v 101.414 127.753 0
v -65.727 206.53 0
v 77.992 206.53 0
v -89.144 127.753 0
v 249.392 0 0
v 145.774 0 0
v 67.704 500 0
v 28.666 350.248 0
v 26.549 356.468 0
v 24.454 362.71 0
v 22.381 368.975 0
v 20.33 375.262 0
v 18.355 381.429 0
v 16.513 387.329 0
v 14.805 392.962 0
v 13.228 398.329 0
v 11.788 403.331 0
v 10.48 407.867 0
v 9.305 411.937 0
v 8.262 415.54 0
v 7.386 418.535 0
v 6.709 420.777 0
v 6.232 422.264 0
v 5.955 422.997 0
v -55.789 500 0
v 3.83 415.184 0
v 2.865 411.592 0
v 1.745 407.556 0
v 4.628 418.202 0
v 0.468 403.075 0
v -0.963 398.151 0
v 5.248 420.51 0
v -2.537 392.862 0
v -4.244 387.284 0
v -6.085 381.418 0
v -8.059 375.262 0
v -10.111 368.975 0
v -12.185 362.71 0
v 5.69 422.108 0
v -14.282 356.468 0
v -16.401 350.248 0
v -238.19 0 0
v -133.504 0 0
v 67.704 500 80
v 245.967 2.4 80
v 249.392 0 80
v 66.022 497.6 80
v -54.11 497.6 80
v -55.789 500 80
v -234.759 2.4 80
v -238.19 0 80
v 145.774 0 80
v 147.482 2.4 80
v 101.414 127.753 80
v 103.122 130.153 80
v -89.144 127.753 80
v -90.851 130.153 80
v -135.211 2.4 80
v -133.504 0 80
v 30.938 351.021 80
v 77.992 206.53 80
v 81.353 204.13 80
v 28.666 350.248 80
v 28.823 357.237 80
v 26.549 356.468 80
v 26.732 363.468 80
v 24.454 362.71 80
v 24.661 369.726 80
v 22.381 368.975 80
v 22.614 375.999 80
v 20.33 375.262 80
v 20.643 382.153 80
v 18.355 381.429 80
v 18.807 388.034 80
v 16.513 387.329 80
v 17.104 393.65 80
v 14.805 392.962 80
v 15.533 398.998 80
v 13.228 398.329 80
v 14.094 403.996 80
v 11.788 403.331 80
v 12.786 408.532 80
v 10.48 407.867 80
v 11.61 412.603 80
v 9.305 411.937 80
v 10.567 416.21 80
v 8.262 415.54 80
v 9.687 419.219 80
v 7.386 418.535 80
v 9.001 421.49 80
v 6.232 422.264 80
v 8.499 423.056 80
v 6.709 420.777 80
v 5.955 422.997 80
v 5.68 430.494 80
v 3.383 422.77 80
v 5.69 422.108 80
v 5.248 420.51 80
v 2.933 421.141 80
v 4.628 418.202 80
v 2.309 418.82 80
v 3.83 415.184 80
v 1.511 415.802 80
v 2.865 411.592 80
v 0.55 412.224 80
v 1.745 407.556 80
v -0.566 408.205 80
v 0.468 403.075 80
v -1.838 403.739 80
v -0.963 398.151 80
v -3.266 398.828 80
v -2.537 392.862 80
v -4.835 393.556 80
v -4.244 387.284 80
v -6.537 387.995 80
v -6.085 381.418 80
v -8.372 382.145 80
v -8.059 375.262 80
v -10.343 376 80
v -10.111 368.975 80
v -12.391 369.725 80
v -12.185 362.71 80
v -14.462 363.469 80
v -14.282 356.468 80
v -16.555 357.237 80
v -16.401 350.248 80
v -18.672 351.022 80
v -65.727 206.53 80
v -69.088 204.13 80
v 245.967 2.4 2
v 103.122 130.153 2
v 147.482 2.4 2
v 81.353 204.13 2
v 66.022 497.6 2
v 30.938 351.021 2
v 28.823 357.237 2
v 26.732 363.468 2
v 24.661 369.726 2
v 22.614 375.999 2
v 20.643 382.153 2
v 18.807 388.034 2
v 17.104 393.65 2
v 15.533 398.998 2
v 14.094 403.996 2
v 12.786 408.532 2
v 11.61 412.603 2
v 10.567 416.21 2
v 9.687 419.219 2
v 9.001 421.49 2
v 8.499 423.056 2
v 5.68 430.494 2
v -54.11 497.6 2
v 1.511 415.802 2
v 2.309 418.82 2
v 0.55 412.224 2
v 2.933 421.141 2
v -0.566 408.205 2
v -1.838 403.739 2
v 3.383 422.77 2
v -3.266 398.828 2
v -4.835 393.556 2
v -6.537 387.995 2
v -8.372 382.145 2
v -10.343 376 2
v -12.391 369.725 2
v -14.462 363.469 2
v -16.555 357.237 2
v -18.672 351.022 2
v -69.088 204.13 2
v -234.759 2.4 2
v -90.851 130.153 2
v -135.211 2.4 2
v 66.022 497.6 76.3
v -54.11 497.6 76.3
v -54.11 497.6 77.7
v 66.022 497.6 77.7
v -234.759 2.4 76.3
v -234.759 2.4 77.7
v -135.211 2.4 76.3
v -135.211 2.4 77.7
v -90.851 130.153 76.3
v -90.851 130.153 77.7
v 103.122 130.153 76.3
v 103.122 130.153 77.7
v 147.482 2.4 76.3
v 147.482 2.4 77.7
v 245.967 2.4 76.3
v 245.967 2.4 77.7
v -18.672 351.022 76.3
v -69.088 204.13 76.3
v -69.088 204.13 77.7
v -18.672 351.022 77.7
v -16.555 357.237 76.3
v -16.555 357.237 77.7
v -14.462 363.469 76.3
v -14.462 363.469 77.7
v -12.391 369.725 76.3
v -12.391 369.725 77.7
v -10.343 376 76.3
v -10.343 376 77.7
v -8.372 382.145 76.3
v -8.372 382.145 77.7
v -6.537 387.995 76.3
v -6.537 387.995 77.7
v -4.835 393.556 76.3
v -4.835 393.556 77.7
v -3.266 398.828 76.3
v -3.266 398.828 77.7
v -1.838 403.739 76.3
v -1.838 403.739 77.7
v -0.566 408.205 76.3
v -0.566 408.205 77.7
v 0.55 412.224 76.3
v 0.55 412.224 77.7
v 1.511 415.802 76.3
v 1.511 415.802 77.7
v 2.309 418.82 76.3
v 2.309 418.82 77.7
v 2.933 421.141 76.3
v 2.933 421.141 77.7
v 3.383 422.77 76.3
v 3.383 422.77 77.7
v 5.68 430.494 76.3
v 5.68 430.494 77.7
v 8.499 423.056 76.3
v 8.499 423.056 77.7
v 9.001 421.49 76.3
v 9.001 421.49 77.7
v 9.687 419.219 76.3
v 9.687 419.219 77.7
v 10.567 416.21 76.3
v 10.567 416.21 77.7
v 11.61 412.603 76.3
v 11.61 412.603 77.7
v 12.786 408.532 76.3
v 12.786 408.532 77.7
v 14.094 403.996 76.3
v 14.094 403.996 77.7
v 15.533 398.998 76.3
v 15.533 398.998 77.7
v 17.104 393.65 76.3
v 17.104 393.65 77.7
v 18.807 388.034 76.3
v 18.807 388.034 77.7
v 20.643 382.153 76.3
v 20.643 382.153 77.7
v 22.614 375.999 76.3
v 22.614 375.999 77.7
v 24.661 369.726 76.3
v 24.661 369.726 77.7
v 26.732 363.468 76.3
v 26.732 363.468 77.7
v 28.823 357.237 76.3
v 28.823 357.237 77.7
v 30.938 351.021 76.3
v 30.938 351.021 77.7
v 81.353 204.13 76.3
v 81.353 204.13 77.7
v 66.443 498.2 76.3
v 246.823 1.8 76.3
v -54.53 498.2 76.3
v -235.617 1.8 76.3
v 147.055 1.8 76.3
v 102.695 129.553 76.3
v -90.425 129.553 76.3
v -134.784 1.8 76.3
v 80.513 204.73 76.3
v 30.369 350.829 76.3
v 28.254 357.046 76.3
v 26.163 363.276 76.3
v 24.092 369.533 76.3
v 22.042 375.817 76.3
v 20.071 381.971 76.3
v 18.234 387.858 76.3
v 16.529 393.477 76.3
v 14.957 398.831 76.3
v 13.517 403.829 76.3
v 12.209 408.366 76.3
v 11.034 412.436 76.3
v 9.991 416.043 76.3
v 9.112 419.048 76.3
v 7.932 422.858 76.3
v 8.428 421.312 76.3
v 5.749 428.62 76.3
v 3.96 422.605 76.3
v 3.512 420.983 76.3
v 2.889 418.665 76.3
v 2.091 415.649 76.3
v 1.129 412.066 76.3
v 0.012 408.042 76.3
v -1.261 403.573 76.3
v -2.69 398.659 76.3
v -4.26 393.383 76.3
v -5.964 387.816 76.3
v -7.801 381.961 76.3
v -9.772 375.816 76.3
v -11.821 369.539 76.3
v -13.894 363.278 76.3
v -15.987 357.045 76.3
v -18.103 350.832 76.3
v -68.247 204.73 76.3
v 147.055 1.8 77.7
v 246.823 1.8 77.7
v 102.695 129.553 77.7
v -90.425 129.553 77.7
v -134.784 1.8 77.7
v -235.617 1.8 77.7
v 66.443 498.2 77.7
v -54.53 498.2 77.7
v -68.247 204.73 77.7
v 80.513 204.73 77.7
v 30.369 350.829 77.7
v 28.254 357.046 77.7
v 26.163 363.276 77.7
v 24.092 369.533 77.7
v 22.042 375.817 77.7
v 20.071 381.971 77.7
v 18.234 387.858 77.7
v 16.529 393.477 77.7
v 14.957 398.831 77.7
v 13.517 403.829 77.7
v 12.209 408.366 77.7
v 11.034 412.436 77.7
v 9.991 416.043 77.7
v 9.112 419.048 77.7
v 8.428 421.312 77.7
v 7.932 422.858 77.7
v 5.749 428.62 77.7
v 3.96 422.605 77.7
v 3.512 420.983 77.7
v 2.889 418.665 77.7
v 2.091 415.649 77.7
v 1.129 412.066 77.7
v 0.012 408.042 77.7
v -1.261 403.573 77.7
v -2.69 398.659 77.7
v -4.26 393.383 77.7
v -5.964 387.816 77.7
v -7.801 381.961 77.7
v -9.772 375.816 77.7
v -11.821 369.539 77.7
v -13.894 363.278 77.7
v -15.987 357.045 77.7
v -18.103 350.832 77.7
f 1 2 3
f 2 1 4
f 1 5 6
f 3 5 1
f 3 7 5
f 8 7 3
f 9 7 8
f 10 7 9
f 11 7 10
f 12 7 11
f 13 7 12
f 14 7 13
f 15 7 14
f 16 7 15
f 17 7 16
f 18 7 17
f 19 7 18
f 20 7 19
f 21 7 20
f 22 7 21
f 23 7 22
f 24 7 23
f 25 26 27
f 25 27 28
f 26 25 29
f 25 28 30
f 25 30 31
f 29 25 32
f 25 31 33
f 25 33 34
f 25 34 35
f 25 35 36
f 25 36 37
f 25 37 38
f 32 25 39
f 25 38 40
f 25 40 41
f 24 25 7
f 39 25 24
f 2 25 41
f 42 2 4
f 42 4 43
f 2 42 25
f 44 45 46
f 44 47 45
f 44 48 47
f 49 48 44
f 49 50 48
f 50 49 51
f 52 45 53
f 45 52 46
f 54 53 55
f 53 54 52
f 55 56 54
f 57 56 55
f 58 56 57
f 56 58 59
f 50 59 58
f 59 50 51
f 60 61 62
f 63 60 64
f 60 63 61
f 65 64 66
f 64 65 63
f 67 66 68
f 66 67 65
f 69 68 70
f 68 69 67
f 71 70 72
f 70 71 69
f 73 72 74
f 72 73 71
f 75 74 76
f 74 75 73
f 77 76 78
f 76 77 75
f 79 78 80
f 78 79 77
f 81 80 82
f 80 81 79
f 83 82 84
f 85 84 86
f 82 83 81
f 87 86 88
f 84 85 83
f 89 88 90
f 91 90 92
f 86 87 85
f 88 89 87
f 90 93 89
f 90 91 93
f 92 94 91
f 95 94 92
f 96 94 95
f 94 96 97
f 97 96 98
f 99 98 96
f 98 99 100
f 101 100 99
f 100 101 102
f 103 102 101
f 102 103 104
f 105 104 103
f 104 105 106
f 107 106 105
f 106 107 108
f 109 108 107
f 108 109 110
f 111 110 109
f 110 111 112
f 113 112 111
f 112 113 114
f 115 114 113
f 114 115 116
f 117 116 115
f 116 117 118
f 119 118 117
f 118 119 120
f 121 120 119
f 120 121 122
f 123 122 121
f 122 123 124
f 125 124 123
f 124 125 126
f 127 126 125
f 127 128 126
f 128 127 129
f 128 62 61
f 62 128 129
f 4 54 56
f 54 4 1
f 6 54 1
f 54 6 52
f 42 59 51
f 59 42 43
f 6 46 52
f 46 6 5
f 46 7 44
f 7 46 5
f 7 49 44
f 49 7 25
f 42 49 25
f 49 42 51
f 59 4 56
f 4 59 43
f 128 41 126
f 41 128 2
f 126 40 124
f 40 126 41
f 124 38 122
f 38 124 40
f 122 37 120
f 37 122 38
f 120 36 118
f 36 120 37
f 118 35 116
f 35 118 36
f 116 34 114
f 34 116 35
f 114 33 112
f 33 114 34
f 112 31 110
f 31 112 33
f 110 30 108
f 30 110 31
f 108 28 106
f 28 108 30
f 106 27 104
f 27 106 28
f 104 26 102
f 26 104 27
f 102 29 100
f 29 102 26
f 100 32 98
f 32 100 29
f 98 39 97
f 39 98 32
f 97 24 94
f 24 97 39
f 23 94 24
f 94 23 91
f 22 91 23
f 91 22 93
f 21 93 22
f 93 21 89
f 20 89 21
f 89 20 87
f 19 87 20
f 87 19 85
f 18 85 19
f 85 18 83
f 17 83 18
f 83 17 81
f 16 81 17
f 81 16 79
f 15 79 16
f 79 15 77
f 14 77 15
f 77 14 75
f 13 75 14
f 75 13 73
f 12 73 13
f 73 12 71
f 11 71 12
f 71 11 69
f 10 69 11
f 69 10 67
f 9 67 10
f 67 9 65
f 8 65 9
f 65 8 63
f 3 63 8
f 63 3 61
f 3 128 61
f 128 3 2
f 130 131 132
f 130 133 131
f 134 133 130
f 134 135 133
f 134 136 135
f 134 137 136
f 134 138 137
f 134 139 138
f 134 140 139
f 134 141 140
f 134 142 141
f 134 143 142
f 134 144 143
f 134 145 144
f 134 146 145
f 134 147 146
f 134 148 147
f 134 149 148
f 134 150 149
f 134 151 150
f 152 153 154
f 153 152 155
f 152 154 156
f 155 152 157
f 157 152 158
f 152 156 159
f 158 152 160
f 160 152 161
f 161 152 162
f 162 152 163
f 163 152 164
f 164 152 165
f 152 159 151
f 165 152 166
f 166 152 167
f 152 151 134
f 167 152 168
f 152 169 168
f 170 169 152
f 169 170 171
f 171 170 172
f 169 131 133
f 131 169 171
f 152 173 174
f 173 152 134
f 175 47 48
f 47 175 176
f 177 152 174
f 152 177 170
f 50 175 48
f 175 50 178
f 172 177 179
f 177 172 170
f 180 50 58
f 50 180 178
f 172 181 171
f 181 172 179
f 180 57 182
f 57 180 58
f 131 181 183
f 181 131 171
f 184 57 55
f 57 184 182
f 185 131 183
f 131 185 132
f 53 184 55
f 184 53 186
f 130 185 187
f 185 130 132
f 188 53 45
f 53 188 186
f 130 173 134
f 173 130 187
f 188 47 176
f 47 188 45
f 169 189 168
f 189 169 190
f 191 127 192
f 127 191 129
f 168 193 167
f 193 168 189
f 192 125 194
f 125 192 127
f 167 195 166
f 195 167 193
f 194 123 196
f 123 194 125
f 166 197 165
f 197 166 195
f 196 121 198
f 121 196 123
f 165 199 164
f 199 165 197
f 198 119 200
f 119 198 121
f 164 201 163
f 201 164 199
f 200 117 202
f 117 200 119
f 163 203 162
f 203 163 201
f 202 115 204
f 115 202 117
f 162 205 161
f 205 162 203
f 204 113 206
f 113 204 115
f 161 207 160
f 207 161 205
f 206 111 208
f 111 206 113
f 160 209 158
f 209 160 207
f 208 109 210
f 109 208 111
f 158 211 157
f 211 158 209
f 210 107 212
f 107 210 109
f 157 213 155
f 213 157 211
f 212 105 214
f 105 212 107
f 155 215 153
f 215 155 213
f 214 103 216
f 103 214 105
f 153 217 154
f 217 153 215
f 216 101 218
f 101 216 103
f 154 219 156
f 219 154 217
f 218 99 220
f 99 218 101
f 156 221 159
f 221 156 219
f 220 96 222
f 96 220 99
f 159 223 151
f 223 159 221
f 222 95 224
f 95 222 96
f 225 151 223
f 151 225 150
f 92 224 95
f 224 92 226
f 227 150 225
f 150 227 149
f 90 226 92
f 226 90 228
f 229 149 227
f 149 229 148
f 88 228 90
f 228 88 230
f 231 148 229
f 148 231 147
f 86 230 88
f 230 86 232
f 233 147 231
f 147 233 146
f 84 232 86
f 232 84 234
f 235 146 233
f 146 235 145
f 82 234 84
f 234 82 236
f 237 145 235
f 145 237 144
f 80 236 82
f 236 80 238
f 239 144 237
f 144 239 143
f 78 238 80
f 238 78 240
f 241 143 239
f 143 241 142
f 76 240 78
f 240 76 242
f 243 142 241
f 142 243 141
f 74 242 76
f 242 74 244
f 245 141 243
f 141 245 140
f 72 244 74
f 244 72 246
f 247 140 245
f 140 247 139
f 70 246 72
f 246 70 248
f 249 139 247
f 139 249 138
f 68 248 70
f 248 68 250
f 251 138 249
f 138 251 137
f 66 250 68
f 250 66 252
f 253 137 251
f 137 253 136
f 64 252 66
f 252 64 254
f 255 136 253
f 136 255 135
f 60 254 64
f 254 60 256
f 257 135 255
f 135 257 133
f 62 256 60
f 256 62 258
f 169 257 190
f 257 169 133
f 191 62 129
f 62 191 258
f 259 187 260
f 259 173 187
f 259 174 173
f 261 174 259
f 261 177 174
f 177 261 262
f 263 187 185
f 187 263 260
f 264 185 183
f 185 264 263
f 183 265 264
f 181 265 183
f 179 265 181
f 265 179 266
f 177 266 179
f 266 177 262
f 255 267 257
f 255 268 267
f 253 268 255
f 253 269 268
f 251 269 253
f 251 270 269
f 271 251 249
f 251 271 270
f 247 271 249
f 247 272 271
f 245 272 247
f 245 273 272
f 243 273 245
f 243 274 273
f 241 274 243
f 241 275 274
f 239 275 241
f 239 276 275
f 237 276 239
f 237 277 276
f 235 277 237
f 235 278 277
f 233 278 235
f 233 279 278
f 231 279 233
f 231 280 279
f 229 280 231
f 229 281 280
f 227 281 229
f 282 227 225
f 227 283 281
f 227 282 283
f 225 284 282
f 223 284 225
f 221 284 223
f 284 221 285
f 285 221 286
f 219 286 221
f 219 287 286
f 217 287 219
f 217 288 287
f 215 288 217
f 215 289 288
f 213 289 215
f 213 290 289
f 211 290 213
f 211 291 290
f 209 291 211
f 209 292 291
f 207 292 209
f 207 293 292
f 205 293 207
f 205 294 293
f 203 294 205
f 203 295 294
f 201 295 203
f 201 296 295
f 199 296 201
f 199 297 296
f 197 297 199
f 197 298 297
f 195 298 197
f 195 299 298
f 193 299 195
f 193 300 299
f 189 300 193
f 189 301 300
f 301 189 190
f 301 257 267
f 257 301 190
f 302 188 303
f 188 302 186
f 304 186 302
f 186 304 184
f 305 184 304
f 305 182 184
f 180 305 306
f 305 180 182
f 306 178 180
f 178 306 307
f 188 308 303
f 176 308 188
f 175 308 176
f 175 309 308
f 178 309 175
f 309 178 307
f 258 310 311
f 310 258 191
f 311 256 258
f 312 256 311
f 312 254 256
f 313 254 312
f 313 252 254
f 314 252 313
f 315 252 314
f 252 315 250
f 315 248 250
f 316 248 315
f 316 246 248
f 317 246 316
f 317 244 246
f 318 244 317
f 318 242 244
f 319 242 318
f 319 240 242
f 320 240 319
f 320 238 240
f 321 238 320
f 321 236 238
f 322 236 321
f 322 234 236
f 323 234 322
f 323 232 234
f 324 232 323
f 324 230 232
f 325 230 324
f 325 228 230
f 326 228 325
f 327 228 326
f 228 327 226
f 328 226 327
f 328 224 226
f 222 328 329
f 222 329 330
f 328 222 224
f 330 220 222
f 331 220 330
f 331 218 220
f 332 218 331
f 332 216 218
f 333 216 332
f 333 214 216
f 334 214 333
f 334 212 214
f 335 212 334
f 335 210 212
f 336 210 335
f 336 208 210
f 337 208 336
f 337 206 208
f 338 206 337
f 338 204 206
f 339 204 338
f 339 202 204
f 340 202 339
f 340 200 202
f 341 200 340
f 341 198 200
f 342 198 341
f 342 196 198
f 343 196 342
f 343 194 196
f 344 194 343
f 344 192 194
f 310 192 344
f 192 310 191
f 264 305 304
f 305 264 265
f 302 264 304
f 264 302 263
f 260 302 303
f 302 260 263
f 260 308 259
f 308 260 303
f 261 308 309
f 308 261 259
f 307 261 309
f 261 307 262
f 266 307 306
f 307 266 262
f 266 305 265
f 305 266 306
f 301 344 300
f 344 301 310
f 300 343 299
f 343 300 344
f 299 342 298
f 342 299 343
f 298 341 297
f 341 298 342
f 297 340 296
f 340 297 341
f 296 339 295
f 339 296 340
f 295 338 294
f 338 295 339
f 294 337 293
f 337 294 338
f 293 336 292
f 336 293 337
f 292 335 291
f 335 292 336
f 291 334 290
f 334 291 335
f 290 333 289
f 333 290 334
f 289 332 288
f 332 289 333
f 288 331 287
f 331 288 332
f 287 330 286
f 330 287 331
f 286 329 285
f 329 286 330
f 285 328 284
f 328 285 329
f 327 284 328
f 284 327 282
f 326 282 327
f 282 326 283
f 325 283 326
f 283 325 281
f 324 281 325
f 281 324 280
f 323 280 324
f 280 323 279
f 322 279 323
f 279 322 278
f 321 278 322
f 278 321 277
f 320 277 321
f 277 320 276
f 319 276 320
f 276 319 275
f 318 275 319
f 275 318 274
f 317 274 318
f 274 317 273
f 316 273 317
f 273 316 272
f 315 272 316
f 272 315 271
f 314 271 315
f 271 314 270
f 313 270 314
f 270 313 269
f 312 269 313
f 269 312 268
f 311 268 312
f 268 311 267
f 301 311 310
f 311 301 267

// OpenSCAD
// file: lib/snap_fit.scad
// snap_fit.scad
// Screw-free joints that follow the letter's own outline, so they work for
// any glyph without knowing its shape in advance. Every module takes the 2D
// outline as children().
//
// Tile-to-tile joint (at any vertical or horizontal cut line):
//   - The wall is locally thickened inward into a "collar" around the cut.
//   - The tile on the - side grows a continuous TONGUE out of the collar (a thin
//     ring centred in the wall) with a small BEAD near its tip.
//   - The tile on the + side has the matching GROOVE: a narrow mouth followed by a
//     wider relief chamber. The bead is slightly wider than the mouth, so it
//     clicks past it and stays locked -- the same continuous snap lip used on
//     3D-printed enclosure lids. Pry apart to disassemble.
//
// Diffuser-to-carcaza joint (along Z, at the open front face):
//   - A thin rim on the diffuser, with an outward bead, snaps into a shallow
//     groove on the inner face of the return wall.
//
// Every step here lies in the XY plane and the carcaza prints standing on its
// back (Z up), so none of these features needs supports.

// Region between the outline inset by `a` and inset by `b` (a < b).
module ring2d(a, b) {
    difference() {
        offset(delta = -a) children();
        offset(delta = -b) children();
    }
}

// Band of the plane between lo..hi along `axis` (0 = X, 1 = Y), unbounded
// along the other axis.
module band2d(lo, hi, axis = 1) {
    if (axis == 1) translate([-5000, lo]) square([10000, hi - lo]);
    else           translate([lo, -5000]) square([hi - lo, 10000]);
}

// A joint runs along a cut line at coordinate `at` on `axis` (0 = vertical
// cut at x=at, 1 = horizontal cut at y=at). `span_lo..span_hi` limits it
// along the cut line (the tile's extent on the other axis, minus corner
// keep-outs where two cut lines cross).

// Local inward thickening of the wall around the cut line. The tiny outward
// offset merges parts of the region that would otherwise touch along a
// zero-width line (e.g. at the sharp apex of a counter), which exports as
// non-manifold edges.
module joint_collar(at, axis, span_lo, span_hi, wall_t, collar_t, collar_h, z0, z1) {
    translate([0, 0, z0])
        linear_extrude(height = z1 - z0)
            offset(delta = 0.01) intersection() {
                ring2d(0, wall_t + collar_t) children();
                band2d(at - collar_h, at + collar_h, axis);
                band2d(span_lo, span_hi, 1 - axis);
            }
}

// Tongue, protruding in +axis from the cut line (distances measured inward
// from the outer outline):
//   t1..t2      : tongue faces (tongue thickness = t2 - t1)
//   bead        : extra width per side at the bead
//   lead        : width reduction per side at the tip (lead-in)
//   len         : total protrusion past the cut line
//   bead_y0/y1  : range (relative to the cut) that carries the bead
module joint_tongue(at, axis, span_lo, span_hi, z0, z1, t1, t2, len, bead, lead,
                    bead_y0, bead_y1, overlap = 0.6) {
    translate([0, 0, z0])
        linear_extrude(height = z1 - z0)
            intersection() {
                union() {
                    intersection() {
                        ring2d(t1, t2) children();
                        band2d(at - overlap, at + bead_y0 + 0.01, axis);
                    }
                    intersection() {
                        ring2d(t1 - bead, t2 + bead) children();
                        band2d(at + bead_y0, at + bead_y1 + 0.01, axis);
                    }
                    intersection() {
                        ring2d(t1 + lead, t2 - lead) children();
                        band2d(at + bead_y1, at + len, axis);
                    }
                }
                band2d(span_lo, span_hi, 1 - axis);
            }
}

// Matching groove, cut into the tile whose -axis edge is at `at`.
module joint_groove(at, axis, span_lo, span_hi, z0, z1, t1, t2, len, bead, bead_y0,
                    clearance, slack = 0.6) {
    mouth_end = at + bead_y0 - 0.2;
    translate([0, 0, z0])
        linear_extrude(height = z1 - z0)
            intersection() {
                union() {
                    intersection() {
                        ring2d(t1 - clearance, t2 + clearance) children();
                        band2d(at - 1, mouth_end + 0.01, axis);
                    }
                    intersection() {
                        ring2d(t1 - bead - clearance, t2 + bead + clearance) children();
                        band2d(mouth_end, at + len + slack, axis);
                    }
                }
                band2d(span_lo - clearance, span_hi + clearance, 1 - axis);
            }
}

// Shallow groove on the inner face of the return wall, near the front, that
// the diffuser rim's bead snaps into.
module diffusor_groove(wall_t, depth_into_wall, z_center, groove_h) {
    translate([0, 0, z_center - groove_h / 2])
        linear_extrude(height = groove_h)
            ring2d(wall_t - depth_into_wall, wall_t + 0.01) children();
}

// Small printable calibration coupon: the same joint applied to a 40x30 mm
// rectangular "letter". Print one at a few clearances and keep the value
// that clicks together firmly by hand and can still be pried apart.
module snap_test_coupon(wall_t = 2.4, collar_t = 3.4, t1 = 1.8, t2 = 3.9,
                         len = 5, bead = 0.35, lead = 0.3, bead_y0 = 2.2,
                         bead_y1 = 3.6, clearance = 0.18) {
    h = 12;           // height of each half
    d = 20;           // depth (Z)
    back_t = 2;
    z0 = back_t;
    z1 = d - 2;

    module outline() { translate([-20, -15]) square([40, 30]); }
    module shell_band(y0, y1) {
        intersection() {
            union() {
                linear_extrude(height = d) ring2d(0, wall_t) outline();
                linear_extrude(height = back_t) outline();
            }
            translate([-50, y0, -1]) cube([100, y1 - y0, d + 2]);
        }
        intersection() {
            joint_collar(0, 1, -100, 100, wall_t, collar_t, h, z0, z1) outline();
            translate([-50, y0, -1]) cube([100, y1 - y0, d + 2]);
        }
    }

    // Lower half (tongue) -- only the band just below the cut is printed.
    translate([-30, 0, 0]) {
        intersection() {
            union() {
                shell_band(-h, 0);
                joint_tongue(0, 1, -100, 100, z0 + 0.3, z1 - 0.3, t1, t2, len, bead, lead, bead_y0, bead_y1) outline();
            }
            translate([-50, -h, -1]) cube([100, h + len + 1, d + 2]);
        }
    }
    // Upper half (groove), printed next to it.
    translate([30, 0, 0]) {
        difference() {
            shell_band(0, h);
            joint_groove(0, 1, -100, 100, z0, z1, t1, t2, len, bead, bead_y0, clearance) outline();
        }
    }
}
// main file
// part.scad
// Command-line entry point. generate.py invokes openscad against this file
// once per (letter, tile, part), passing parameters with -D. Example:
//   openscad -o out.stl -D 'ch="A"' -D letter_height=500 -D depth=80 \
//            -D x_lo=-250 -D x_hi=0 -D y_lo=0 -D y_hi=166.7 \
//            -D cut_right=true -D cut_top=true -D 'part="carcaza"' part.scad
// Calibration coupon for the snap joint:
//   openscad -o coupon.stl -D 'part="snap_test_coupon"' -D joint_clearance=0.18 part.scad

include <channel_letter.scad>

// ---- parameters (overridden via -D) ----
ch = "A";
font = "Liberation Sans:style=Bold";
letter_height = 500;   // mm, overall glyph height
depth = 80;            // mm, front-to-back depth
wall_t = 2.4;          // mm, return wall
back_t = 2.0;          // mm, back wall
x_lo = -1000;          // mm, tile bounds (default: whole letter)
x_hi = 1000;
y_lo = 0;
y_hi = 1000;
cut_left = false;      // true when that edge is shared with a neighbour tile
cut_right = false;
cut_bottom = false;
cut_top = false;
ribs = [];             // [[x1,y1,x2,y2],...] bridges between disjoint islands

// tile-to-tile snap joint
collar_t = 3.4;
collar_h = 10;
tongue_t1 = 1.8;
tongue_t2 = 3.9;
tongue_len = 5;
bead = 0.35;
joint_clearance = 0.18;

// interior: XY points chosen by generate.py
leds = [];   // WS2812B 12 mm pixel sockets
rigs = [];   // zip-tie rigging points

// diffuser
diffusor_t = 1.6;
rim_depth = 6;
rim_t = 1.2;
rim_clearance = 0.25;
diffusor_bead = 0.7;

part = "carcaza"; // "carcaza" | "diffusor" | "snap_test_coupon"

if (part == "carcaza") {
    carcaza_tile(ch, letter_height, depth, wall_t, back_t, font,
                    x_lo, x_hi, y_lo, y_hi, cut_left, cut_right, cut_bottom, cut_top,
                    ribs = ribs,
                    collar_t = collar_t, collar_h = collar_h,
                    tongue_t1 = tongue_t1, tongue_t2 = tongue_t2, tongue_len = tongue_len,
                    bead = bead, joint_clearance = joint_clearance,
                    leds = leds, rigs = rigs,
                    rim_depth = rim_depth, diffusor_bead = diffusor_bead,
                    rim_clearance = rim_clearance);
} else if (part == "diffusor") {
    diffusor_tile(ch, letter_height, depth, wall_t, font, x_lo, x_hi, y_lo, y_hi,
                     diffusor_t = diffusor_t, rim_depth = rim_depth, rim_t = rim_t,
                     rim_clearance = rim_clearance, diffusor_bead = diffusor_bead);
} else if (part == "snap_test_coupon") {
    snap_test_coupon(wall_t = wall_t, collar_t = collar_t, t1 = tongue_t1, t2 = tongue_t2,
                     len = tongue_len, bead = bead, clearance = joint_clearance);
} else {
    assert(false, str("Unknown part: ", part));
}
